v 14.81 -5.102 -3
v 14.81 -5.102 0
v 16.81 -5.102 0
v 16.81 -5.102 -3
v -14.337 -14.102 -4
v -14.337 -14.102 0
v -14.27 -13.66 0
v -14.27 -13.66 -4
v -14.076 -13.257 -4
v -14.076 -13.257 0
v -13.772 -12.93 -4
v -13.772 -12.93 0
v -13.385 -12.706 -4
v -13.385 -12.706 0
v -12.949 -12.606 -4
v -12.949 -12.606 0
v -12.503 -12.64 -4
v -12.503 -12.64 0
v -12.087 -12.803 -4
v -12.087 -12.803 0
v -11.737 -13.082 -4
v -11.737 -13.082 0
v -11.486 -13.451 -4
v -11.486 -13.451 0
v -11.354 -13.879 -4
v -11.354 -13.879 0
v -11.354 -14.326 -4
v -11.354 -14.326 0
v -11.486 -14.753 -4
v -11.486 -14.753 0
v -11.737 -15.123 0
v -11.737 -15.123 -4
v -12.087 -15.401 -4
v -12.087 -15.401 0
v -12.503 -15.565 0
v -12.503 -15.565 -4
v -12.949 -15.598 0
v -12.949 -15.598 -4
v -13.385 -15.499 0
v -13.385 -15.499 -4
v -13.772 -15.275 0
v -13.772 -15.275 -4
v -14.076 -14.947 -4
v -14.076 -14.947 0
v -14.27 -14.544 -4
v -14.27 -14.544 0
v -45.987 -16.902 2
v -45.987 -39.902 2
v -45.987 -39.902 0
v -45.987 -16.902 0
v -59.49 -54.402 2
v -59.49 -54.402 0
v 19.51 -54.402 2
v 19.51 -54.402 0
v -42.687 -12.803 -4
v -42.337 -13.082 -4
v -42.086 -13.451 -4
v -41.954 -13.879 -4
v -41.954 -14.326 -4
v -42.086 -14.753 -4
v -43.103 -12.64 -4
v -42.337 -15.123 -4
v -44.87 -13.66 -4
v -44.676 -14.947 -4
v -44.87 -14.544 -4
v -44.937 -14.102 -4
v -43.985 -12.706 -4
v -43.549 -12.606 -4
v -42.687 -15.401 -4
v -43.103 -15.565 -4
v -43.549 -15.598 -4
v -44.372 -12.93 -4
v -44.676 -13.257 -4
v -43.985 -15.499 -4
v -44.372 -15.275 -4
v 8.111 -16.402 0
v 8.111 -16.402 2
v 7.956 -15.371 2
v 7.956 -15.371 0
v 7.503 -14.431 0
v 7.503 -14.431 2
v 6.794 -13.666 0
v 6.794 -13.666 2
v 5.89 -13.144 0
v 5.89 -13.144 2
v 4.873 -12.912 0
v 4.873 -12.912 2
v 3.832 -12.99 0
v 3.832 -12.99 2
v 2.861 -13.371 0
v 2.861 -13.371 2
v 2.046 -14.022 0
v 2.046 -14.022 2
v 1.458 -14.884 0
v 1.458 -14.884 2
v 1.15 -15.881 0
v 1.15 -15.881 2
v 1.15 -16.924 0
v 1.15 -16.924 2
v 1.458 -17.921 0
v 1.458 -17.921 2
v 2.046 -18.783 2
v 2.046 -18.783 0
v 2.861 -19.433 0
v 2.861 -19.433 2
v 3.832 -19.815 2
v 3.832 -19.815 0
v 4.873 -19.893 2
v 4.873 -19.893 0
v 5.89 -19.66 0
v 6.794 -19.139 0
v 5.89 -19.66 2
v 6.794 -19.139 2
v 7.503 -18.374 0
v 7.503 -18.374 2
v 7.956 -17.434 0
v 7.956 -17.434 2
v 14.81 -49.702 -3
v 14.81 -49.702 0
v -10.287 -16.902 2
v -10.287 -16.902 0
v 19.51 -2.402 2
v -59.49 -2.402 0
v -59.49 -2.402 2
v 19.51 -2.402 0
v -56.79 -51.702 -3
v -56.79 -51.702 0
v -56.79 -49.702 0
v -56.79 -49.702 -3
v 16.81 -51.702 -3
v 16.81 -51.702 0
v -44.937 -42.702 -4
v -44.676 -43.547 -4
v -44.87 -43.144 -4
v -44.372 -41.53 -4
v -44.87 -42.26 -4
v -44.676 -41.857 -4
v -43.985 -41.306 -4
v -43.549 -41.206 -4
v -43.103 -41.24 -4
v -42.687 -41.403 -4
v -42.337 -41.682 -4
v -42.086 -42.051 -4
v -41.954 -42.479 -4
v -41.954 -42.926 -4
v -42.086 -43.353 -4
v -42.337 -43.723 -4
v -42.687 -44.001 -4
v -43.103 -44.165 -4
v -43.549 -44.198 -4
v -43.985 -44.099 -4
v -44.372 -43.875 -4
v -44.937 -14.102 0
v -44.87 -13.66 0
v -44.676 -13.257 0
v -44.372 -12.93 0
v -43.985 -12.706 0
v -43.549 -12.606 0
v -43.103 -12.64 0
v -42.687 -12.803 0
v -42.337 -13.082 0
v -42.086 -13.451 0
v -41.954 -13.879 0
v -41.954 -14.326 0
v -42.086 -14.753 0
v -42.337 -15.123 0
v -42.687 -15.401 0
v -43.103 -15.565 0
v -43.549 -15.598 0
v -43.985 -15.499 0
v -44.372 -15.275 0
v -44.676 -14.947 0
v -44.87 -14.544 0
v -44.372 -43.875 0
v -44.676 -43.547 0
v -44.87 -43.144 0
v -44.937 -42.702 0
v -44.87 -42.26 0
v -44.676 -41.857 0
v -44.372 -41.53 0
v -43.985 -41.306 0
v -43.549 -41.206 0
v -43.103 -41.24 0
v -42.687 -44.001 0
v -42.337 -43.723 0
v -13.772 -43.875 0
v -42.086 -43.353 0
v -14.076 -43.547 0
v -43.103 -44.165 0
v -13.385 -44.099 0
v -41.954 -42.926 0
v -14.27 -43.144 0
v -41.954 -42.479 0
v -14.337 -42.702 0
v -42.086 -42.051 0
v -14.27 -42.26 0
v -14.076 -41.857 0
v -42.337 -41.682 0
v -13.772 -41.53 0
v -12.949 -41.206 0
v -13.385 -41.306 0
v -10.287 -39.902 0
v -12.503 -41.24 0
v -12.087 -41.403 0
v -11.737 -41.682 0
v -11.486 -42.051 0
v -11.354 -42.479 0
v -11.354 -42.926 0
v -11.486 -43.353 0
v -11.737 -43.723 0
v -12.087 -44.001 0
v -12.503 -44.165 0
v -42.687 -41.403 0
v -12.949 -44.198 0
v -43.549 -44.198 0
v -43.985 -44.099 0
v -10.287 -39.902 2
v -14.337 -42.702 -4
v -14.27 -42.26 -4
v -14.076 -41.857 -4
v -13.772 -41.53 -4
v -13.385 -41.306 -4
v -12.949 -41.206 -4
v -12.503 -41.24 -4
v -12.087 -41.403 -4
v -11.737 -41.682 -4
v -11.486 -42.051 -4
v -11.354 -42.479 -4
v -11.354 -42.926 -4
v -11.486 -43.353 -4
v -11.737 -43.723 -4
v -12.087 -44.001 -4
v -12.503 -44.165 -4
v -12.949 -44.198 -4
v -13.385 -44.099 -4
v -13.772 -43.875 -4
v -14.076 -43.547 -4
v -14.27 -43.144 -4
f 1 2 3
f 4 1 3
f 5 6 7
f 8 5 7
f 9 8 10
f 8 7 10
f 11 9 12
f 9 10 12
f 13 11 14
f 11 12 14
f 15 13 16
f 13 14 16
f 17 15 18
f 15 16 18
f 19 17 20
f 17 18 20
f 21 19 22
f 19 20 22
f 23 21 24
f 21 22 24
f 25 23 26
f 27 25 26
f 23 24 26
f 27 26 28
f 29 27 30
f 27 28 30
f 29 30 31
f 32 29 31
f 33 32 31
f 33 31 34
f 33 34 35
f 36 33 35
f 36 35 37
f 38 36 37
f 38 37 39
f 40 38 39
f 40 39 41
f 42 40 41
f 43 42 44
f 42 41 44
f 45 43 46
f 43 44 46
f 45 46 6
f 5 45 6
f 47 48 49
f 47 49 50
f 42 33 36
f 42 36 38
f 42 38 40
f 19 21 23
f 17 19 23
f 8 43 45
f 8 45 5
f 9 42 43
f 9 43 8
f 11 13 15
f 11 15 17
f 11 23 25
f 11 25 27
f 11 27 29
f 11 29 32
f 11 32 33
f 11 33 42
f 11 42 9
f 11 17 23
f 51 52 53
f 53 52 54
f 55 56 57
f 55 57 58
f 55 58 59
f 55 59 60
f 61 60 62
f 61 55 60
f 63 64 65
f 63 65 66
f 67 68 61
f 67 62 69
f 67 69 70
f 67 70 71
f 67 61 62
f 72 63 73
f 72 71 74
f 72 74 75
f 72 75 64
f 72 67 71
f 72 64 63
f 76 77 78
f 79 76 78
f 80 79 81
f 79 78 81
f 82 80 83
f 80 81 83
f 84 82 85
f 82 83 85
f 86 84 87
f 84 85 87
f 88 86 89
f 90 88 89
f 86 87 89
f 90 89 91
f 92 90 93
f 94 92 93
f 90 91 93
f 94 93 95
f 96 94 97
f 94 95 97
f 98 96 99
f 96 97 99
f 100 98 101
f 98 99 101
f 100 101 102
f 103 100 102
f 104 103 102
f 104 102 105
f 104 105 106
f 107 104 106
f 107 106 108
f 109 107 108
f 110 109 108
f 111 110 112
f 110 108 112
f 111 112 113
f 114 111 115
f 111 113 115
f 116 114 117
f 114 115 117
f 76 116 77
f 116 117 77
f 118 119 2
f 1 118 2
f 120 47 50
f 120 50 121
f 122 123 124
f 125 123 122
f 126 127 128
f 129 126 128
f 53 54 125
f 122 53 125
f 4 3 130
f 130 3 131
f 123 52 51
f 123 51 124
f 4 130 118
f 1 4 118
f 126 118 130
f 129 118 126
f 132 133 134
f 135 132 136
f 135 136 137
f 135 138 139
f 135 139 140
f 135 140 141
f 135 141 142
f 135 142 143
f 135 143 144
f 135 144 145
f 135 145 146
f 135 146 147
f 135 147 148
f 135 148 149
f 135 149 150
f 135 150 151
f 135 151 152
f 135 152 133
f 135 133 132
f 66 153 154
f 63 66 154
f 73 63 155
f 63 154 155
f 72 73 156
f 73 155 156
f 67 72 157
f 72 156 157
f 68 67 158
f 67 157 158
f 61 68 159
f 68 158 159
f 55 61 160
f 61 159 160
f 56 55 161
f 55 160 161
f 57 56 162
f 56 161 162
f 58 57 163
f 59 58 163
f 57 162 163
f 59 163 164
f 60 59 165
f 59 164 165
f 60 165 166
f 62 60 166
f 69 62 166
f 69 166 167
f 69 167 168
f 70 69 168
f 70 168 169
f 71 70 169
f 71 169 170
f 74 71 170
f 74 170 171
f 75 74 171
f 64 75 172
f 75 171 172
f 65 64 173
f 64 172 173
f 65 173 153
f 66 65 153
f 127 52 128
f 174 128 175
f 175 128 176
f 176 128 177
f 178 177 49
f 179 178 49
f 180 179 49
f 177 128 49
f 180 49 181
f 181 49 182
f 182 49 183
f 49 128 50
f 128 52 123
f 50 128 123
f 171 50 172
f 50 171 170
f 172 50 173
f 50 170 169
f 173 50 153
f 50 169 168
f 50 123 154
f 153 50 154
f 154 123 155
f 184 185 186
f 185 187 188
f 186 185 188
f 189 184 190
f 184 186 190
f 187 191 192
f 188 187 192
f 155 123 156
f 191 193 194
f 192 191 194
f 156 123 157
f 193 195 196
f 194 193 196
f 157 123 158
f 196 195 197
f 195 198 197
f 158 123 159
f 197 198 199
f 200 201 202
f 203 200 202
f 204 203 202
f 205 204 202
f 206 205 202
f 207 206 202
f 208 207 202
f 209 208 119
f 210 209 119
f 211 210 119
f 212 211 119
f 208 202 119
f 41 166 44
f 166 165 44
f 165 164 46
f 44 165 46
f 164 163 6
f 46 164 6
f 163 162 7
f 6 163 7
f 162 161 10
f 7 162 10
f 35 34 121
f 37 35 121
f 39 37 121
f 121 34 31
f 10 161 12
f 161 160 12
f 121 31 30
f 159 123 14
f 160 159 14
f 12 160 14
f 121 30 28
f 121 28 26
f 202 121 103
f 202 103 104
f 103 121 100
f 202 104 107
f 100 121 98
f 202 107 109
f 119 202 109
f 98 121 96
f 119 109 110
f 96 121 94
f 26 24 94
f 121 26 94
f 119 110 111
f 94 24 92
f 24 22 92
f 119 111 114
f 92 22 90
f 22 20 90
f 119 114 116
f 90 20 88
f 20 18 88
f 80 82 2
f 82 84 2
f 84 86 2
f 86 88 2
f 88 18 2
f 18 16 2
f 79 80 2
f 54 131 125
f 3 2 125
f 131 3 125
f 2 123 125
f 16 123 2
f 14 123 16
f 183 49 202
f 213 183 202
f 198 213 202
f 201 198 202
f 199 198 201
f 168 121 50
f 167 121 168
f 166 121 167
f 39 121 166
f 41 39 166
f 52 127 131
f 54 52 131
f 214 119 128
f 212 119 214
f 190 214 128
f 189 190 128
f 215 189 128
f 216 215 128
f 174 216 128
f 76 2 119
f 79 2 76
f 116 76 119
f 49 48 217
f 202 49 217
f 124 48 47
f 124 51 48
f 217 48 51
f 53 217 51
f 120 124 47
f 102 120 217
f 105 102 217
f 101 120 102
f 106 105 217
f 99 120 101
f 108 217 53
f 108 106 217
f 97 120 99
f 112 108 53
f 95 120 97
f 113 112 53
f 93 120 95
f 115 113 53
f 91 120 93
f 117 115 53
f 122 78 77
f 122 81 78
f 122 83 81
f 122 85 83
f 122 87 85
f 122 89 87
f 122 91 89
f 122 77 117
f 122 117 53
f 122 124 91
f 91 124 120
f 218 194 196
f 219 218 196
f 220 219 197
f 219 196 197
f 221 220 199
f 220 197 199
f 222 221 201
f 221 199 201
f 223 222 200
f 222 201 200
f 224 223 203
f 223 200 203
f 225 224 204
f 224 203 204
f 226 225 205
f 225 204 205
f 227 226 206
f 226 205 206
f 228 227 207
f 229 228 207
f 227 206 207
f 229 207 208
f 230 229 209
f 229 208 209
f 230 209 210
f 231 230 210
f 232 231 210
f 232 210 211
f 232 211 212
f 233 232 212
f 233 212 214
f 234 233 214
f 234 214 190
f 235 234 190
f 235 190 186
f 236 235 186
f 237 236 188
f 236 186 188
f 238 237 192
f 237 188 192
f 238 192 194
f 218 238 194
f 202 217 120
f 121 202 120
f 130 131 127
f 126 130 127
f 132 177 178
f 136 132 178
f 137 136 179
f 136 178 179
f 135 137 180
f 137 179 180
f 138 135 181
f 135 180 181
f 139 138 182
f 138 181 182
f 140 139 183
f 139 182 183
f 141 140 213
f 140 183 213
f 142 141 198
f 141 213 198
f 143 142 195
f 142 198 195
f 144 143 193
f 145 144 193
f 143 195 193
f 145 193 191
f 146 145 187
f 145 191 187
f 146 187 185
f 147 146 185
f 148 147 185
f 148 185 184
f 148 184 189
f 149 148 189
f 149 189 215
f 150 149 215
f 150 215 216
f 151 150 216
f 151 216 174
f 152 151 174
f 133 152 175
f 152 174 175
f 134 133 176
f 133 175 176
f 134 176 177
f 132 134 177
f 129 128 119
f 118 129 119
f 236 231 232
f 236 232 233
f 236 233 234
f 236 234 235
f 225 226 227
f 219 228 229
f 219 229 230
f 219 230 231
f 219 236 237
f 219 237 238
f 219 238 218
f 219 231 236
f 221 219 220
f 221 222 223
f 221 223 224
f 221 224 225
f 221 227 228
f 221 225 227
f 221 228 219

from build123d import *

# Parameters (mm, degrees)
SKIZZE10_W                       = 79
SKIZZE10_H                       = 52
AUFSATZ_LINEAR_AUSTRAGEN8_DEPTH  = 2
SKIZZE11_W                       = 35.7
SKIZZE11_H                       = 23
SCHNITT_LINEAR_AUSTRAGEN3_DEPTH  = 2
SKIZZE13_R                       = 3.5
SCHNITT_LINEAR_AUSTRAGEN4_DEPTH  = 2
SKIZZE14_R                       = 1.5
AUFSATZ_LINEAR_AUSTRAGEN9_DEPTH  = 4
AUFSATZ_LINEAR_AUSTRAGEN10_DEPTH = 3


with BuildPart() as part:
    # Skizze10 → Aufsatz-Linear austragen8 (new body)
    with BuildSketch(Plane.XY):
        with Locations((-19.990421456, -28.402298851)):
            Rectangle(SKIZZE10_W, SKIZZE10_H)
    extrude(amount=AUFSATZ_LINEAR_AUSTRAGEN8_DEPTH)

    # Skizze11 → Schnitt-Linear austragen3 (cut)
    with BuildSketch(Plane.XY.offset(2)):
        with Locations((-28.136972684, -28.402298851)):
            Rectangle(SKIZZE11_W, SKIZZE11_H)
    extrude(amount=-SCHNITT_LINEAR_AUSTRAGEN3_DEPTH, mode=Mode.SUBTRACT)

    # Skizze13 → Schnitt-Linear austragen4 (cut)
    with BuildSketch(Plane.XY.offset(2)):
        with Locations((4.61130293, -16.402298851)):
            Circle(SKIZZE13_R)
    extrude(amount=-SCHNITT_LINEAR_AUSTRAGEN4_DEPTH, mode=Mode.SUBTRACT)

    # Skizze14 → Aufsatz-Linear austragen9 (add)
    with BuildSketch(Plane(origin=(0, 0, 0), x_dir=(-1, 0, 0), z_dir=(0, 0, -1))):
        with Locations((43.436972684, -14.102298851)):
            Circle(SKIZZE14_R)
        with Locations((43.436972684, -42.702298851)):
            Circle(SKIZZE14_R)
        with Locations((12.836972684, -14.102298851)):
            Circle(SKIZZE14_R)
        with Locations((12.836972684, -42.702298851)):
            Circle(SKIZZE14_R)
    extrude(amount=AUFSATZ_LINEAR_AUSTRAGEN9_DEPTH)

    # Skizze15 → Aufsatz-Linear austragen10 (add)
    with BuildSketch(Plane(origin=(0, 0, 0), x_dir=(-1, 0, 0), z_dir=(0, 0, -1))):
        Polygon((-16.809578544, -5.102298851), (-16.809578544, -51.702298851), (56.790421456, -51.702298851), (56.790421456, -49.702298851), (-14.809578544, -49.702298851), (-14.809578544, -5.102298851), align=None)
    extrude(amount=AUFSATZ_LINEAR_AUSTRAGEN10_DEPTH)


solid = part.part
